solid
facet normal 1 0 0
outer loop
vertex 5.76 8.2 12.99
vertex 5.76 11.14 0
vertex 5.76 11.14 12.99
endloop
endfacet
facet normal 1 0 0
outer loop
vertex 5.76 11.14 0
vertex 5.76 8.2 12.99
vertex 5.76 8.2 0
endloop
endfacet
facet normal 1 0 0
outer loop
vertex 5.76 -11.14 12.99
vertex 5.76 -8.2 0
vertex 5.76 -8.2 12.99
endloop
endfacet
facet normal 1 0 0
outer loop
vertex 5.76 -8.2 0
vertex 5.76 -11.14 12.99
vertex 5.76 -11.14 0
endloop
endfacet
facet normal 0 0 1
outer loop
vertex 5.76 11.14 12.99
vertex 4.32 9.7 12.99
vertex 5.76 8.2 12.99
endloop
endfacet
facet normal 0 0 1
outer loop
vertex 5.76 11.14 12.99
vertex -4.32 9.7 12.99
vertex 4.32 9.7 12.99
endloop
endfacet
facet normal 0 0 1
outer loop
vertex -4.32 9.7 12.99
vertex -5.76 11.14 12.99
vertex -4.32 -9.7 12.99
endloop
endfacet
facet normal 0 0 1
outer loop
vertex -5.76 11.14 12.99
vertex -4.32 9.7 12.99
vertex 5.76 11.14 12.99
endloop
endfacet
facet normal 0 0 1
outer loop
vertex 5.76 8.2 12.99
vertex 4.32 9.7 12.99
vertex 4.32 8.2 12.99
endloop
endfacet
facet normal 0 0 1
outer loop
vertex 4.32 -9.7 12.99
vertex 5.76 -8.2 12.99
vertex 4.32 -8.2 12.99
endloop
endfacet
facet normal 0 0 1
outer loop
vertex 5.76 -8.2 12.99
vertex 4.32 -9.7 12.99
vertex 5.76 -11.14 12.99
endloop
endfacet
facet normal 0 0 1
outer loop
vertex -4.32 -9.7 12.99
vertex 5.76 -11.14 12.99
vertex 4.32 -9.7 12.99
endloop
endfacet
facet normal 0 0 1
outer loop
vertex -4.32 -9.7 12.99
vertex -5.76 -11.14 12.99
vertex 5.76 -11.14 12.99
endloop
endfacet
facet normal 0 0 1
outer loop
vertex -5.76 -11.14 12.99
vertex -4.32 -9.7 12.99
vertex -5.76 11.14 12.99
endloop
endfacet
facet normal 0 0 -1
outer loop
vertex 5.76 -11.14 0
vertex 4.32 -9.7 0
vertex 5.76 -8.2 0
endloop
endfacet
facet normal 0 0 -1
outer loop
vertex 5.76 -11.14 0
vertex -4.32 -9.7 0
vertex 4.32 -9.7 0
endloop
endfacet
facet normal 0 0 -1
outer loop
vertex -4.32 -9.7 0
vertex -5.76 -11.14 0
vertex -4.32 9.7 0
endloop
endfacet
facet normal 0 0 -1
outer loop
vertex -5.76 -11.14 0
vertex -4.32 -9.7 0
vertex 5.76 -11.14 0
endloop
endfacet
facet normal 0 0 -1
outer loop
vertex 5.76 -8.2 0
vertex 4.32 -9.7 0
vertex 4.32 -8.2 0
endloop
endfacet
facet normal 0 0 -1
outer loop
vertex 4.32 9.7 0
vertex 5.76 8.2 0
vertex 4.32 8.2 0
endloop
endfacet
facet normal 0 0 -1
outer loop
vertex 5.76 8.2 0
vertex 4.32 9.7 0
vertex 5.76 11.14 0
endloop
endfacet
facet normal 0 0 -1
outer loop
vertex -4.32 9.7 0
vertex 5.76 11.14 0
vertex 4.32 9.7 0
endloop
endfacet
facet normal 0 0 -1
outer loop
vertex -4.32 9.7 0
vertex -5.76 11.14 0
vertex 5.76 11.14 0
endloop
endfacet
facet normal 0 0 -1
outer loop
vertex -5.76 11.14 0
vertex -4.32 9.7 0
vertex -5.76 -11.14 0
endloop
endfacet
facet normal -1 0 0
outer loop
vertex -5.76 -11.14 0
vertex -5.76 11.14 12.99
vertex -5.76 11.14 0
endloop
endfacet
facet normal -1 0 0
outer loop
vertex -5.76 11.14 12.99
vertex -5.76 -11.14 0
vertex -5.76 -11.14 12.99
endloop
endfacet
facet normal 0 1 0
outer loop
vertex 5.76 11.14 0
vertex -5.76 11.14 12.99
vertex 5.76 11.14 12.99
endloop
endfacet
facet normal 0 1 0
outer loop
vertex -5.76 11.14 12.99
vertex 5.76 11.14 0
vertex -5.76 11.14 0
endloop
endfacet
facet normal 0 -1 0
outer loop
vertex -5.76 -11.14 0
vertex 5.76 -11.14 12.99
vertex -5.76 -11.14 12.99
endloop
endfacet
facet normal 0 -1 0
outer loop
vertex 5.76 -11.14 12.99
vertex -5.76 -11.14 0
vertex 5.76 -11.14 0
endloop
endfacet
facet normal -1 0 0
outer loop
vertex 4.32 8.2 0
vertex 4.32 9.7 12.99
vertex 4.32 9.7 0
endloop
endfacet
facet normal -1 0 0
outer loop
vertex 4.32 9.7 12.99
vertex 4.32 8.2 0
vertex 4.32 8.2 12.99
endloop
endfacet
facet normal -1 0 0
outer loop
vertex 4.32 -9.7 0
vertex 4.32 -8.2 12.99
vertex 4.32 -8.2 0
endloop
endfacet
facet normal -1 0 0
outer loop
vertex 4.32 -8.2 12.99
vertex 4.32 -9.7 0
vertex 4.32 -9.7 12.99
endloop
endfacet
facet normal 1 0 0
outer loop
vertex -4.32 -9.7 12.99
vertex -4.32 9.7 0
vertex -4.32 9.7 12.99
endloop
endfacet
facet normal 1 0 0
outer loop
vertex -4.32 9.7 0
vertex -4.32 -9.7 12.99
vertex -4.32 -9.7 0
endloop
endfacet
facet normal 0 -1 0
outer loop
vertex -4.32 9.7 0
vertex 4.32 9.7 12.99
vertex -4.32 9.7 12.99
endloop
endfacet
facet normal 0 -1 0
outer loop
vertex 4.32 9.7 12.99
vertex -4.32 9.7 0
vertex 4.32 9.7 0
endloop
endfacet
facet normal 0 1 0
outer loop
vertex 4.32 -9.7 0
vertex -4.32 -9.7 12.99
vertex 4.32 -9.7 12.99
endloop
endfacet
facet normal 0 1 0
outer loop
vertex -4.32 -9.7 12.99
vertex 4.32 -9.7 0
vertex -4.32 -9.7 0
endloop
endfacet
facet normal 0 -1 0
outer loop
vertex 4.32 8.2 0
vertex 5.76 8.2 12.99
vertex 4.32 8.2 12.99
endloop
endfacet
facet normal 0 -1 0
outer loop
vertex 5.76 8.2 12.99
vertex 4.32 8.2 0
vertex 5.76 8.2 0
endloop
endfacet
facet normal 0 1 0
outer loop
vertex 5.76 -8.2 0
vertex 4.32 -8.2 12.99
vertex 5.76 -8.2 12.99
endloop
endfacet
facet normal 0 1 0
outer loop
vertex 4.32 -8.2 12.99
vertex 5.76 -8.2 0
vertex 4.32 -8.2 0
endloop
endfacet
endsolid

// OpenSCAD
height = 12.99;
width = 8.64;
depth = 19.4;
overhang = 1.5;
thickness = 1.44;

translate ([0,0,height/2])
difference () {
cube ([width+2*thickness,depth+2*thickness,height],center=true);
cube ([width,depth,height+1],center=true);
translate ([width/2,0,0])
cube ([width,depth-overhang*2,height+1],center=true);
}
